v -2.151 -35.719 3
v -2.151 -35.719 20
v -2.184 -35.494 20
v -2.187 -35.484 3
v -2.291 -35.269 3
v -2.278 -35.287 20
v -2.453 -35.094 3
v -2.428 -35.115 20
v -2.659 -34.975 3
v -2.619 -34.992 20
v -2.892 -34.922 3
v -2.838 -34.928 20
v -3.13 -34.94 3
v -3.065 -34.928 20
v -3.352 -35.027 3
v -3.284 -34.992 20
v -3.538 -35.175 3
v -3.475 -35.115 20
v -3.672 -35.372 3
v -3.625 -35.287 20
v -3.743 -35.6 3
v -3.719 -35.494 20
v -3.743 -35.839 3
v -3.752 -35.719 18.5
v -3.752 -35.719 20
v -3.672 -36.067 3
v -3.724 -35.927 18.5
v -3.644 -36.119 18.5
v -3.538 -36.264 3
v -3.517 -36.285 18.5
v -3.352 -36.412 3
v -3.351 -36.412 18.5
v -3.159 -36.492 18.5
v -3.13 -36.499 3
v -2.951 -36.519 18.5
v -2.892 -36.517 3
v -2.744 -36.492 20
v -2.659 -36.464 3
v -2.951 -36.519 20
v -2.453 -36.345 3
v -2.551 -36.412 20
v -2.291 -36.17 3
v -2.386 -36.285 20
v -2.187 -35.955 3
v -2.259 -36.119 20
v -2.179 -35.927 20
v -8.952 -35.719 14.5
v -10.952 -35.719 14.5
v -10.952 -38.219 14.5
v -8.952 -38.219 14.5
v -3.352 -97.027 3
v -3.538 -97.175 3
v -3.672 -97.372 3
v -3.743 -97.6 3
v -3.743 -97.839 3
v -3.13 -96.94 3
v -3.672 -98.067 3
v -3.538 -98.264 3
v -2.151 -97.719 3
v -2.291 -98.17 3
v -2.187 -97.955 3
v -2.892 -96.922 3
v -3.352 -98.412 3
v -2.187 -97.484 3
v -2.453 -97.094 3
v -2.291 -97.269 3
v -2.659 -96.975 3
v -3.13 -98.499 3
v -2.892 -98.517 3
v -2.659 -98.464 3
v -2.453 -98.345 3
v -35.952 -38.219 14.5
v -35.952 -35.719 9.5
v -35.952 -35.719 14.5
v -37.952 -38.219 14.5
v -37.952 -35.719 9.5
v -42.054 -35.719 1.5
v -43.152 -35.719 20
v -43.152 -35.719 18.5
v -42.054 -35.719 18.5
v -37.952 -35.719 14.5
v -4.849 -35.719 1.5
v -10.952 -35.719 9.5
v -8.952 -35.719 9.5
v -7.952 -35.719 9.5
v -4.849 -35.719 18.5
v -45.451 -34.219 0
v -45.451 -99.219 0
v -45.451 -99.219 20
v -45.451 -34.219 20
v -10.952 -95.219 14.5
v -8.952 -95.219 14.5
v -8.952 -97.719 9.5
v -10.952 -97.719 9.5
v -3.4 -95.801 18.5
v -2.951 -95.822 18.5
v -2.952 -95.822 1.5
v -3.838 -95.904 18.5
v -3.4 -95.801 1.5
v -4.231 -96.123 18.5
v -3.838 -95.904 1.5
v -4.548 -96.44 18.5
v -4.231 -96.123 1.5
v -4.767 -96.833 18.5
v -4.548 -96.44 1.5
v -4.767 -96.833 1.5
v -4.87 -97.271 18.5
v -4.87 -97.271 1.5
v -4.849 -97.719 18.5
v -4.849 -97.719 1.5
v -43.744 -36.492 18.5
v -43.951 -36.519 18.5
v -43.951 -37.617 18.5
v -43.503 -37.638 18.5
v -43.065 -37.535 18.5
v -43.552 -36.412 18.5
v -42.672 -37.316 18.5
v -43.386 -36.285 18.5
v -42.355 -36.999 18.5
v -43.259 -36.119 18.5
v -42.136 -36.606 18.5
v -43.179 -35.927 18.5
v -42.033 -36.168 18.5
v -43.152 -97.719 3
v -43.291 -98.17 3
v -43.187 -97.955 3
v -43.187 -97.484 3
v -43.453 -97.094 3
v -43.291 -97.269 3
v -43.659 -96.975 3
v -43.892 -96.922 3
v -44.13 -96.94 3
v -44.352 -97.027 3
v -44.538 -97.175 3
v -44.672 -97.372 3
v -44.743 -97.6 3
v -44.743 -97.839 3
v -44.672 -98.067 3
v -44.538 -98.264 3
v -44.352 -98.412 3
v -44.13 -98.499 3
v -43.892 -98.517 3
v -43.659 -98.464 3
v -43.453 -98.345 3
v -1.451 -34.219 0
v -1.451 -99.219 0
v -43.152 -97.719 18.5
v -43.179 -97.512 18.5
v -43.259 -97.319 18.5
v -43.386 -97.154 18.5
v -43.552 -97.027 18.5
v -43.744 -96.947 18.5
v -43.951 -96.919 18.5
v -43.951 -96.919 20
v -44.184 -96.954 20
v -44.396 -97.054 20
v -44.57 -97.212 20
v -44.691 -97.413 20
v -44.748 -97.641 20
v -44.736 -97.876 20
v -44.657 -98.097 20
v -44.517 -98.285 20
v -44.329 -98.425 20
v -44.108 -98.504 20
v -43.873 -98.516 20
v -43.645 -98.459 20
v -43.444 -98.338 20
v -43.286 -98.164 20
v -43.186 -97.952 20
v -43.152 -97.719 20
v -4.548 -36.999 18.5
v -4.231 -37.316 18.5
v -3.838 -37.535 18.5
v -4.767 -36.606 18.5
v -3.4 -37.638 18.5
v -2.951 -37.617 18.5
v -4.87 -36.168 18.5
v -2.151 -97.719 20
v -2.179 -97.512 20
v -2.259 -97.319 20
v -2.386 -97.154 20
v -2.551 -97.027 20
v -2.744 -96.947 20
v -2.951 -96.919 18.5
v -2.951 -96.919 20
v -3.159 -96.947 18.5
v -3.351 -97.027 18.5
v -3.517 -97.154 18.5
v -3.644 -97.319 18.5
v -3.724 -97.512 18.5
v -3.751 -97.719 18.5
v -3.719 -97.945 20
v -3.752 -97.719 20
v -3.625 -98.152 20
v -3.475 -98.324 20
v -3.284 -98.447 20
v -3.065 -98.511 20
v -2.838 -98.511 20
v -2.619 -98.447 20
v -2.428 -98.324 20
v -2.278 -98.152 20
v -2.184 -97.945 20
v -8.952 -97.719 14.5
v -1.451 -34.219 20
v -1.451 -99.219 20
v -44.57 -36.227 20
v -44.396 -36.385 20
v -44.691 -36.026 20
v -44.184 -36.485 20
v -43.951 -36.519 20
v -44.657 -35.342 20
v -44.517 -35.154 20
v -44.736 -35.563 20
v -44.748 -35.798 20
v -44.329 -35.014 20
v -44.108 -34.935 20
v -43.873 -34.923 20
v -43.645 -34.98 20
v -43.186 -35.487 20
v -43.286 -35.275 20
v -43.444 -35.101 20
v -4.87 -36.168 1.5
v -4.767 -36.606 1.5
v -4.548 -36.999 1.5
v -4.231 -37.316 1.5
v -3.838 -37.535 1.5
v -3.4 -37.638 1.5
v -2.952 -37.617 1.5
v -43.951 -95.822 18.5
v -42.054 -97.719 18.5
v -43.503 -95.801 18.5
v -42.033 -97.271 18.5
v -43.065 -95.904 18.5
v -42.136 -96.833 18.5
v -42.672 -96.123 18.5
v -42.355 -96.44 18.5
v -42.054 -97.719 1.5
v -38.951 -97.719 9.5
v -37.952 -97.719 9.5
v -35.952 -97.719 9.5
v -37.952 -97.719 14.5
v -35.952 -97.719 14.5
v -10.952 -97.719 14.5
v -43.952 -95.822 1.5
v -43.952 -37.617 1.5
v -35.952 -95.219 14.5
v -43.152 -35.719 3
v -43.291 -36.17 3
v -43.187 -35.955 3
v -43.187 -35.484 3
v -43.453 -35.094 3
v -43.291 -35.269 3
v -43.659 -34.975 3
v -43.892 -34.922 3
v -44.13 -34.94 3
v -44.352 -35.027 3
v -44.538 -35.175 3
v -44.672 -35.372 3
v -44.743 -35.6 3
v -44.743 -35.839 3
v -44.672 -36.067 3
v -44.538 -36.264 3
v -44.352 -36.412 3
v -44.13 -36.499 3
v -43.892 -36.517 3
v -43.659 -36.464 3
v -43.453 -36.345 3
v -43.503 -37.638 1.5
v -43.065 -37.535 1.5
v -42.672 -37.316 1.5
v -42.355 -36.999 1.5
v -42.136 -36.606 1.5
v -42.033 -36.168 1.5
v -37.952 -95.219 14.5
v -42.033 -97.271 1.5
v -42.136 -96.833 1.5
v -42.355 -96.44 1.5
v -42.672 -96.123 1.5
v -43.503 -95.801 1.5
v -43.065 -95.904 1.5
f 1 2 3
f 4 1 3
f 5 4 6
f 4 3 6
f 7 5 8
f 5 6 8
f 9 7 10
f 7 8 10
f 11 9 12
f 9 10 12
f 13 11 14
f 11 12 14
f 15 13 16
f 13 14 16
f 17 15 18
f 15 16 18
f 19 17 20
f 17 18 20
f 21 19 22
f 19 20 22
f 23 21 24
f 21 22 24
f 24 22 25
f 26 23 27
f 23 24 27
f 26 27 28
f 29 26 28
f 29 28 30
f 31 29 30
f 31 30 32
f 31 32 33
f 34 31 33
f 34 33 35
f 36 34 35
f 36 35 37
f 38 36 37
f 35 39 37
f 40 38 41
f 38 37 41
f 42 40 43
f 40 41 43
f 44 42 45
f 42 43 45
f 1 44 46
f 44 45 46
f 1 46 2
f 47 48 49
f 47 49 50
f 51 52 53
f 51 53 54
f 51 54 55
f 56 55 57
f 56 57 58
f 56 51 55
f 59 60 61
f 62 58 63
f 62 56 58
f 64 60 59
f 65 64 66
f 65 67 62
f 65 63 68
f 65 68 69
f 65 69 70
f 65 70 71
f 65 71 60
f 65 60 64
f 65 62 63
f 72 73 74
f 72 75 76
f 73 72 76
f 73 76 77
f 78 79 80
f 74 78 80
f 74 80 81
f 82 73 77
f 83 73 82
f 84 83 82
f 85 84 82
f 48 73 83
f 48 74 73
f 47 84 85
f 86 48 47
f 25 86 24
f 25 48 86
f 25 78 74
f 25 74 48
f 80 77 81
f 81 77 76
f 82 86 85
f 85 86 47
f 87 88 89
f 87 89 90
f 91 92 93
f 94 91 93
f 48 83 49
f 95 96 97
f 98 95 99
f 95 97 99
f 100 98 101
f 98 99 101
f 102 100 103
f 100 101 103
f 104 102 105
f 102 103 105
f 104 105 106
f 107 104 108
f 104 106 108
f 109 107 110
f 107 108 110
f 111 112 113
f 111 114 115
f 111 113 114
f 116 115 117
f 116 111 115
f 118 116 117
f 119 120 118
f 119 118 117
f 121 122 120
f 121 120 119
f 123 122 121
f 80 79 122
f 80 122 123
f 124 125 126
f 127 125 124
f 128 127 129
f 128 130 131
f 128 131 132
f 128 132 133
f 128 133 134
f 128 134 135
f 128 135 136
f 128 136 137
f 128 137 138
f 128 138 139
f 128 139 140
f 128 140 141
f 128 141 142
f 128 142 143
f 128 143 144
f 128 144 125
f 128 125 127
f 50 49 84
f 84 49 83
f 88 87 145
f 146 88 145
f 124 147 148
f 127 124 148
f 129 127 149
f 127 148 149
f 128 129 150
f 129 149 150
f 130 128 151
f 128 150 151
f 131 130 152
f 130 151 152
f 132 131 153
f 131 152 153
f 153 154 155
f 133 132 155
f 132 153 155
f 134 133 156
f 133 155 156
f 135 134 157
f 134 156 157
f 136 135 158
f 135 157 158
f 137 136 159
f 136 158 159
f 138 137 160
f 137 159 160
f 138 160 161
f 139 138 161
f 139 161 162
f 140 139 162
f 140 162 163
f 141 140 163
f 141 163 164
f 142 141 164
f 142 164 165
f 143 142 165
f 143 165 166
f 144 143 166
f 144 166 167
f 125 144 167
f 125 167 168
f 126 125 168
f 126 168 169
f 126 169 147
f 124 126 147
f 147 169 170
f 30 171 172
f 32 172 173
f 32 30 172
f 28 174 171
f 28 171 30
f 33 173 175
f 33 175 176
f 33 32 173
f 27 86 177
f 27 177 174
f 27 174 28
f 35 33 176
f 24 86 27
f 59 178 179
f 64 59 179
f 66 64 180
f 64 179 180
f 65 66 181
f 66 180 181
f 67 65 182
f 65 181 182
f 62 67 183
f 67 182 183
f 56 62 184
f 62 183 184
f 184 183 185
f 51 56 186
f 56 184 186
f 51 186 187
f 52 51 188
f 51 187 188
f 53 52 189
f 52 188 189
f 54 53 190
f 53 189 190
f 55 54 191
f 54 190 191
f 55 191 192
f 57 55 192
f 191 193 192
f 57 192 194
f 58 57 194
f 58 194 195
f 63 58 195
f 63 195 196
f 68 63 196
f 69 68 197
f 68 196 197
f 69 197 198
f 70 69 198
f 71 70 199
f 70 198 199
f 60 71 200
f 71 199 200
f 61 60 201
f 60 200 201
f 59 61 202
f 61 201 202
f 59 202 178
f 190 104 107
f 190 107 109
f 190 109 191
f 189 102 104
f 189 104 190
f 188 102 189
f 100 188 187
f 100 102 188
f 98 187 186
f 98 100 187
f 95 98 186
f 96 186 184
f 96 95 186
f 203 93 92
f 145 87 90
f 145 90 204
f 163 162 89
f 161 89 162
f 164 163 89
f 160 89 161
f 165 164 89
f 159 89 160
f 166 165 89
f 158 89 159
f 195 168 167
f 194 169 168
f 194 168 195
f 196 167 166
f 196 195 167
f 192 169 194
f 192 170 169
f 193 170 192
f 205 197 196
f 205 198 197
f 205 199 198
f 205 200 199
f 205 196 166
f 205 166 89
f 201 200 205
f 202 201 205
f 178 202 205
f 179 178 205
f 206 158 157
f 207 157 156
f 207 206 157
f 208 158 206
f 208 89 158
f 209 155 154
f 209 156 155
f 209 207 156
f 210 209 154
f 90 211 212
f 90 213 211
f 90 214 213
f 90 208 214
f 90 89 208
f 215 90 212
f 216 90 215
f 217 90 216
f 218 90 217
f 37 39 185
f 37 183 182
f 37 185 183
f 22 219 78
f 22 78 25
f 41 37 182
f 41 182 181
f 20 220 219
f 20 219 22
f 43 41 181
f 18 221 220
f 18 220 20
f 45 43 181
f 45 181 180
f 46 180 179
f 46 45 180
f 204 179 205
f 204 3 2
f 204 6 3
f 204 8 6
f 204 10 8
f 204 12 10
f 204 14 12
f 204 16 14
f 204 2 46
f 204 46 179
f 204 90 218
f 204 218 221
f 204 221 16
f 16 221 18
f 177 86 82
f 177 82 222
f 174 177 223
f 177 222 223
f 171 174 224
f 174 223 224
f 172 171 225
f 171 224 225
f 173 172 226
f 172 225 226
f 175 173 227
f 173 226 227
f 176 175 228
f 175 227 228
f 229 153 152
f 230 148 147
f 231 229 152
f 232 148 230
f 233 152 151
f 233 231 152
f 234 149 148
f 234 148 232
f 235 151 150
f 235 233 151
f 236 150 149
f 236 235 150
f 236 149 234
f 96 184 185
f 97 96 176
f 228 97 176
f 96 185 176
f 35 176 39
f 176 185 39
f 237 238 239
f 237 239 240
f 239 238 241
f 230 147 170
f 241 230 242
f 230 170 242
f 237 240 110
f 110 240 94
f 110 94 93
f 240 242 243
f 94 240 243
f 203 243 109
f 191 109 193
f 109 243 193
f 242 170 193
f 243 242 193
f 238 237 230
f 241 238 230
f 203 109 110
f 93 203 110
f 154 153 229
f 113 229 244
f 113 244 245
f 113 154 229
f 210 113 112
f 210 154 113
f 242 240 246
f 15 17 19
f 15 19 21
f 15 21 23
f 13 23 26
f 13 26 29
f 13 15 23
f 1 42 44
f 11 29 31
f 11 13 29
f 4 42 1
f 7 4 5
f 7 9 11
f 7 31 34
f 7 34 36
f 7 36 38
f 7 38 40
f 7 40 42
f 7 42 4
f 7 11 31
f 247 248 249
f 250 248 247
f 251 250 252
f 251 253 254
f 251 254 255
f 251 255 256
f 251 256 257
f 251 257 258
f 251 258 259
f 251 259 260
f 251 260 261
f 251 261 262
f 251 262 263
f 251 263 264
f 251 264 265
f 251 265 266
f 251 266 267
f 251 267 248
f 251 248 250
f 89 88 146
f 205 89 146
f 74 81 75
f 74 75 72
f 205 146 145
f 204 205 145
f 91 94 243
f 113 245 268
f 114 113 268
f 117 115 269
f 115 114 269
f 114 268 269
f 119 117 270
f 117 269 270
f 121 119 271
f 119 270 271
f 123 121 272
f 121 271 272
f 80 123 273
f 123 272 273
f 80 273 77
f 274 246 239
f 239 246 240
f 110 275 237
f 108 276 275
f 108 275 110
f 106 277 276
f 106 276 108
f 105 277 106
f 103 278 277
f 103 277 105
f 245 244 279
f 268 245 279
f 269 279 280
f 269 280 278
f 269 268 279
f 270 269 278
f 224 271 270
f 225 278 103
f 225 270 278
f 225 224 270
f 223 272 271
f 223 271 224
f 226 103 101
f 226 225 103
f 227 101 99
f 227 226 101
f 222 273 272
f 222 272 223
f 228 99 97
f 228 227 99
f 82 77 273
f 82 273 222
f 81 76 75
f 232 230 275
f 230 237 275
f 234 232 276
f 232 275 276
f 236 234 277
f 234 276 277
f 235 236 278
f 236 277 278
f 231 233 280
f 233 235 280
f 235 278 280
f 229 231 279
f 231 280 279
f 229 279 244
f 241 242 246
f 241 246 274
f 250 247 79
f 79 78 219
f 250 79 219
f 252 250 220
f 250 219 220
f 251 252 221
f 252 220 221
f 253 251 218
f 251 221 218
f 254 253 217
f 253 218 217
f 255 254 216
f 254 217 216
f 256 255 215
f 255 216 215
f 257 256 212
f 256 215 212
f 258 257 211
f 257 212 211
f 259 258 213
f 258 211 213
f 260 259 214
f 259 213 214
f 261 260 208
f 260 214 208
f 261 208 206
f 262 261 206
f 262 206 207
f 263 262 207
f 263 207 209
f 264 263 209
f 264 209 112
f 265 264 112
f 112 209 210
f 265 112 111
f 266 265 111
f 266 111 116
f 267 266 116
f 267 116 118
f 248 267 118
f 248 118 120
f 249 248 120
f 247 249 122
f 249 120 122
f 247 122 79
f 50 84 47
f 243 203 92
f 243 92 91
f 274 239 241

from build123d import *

# Parameters (mm, degrees)
F0_W      = 44
F0_H      = 65
F1_DEPTH  = 20
F2_W      = 41
F2_H      = 62
F3_DEPTH  = 18.5
F4_W      = 2
F4_H      = 5
F5_DEPTH  = 5
F7_DEPTH  = 30
F8_W      = 2
F8_H      = 5
F9_DEPTH  = 5
F11_DEPTH = 30
F13_R     = 1.625
F14_DEPTH = 17
F15_R     = 0.8
F16_DEPTH = 17


with BuildPart() as f1:
    # F0 (on Top) → F1 (new body)
    with BuildSketch(Plane.XY):
        with Locations((-23.4515, -66.719449)):
            Rectangle(F0_W, F0_H)
    extrude(amount=F1_DEPTH)

    # F2 (on face) → F3 (cut)
    with BuildSketch(Plane.XY.offset(20)):
        with Locations((-23.4515, -66.719449)):
            Rectangle(F2_W, F2_H)
    extrude(amount=-F3_DEPTH, mode=Mode.SUBTRACT)

    # F4 (on face) → F5 (join)
    with BuildSketch(Plane.XZ.offset(35.719449)):
        with Locations((-36.9515, 12)):
            Rectangle(F4_W, F4_H)
        with Locations((-9.9515, 12)):
            Rectangle(F4_W, F4_H)
    extrude(amount=F5_DEPTH)

    # F6 (on face) → F7 (cut)
    with BuildSketch(Plane(origin=(-37.9515, 0, 0), x_dir=(0, -1, 0), z_dir=(-1, 0, 0))):
        Polygon((38.219449, 14.5), (35.719449, 9.5), (40.719449, 9.5), (40.719449, 14.5), align=None)
    extrude(amount=-F7_DEPTH, mode=Mode.SUBTRACT)

    # F8 (on face) → F9 (join)
    with BuildSketch(Plane(origin=(0, -97.719449, 0), x_dir=(-1, 0, 0), z_dir=(0, 1, 0))):
        with Locations((36.9515, 12)):
            Rectangle(F8_W, F8_H)
        with Locations((9.9515, 12)):
            Rectangle(F8_W, F8_H)
    extrude(amount=F9_DEPTH)

    # F10 (on face) → F11 (cut)
    with BuildSketch(Plane.YZ.offset(-8.9515)):
        Polygon((-95.219449, 14.5), (-97.719449, 9.5), (-92.719449, 9.5), (-92.719449, 14.5), align=None)
    extrude(amount=-F11_DEPTH, mode=Mode.SUBTRACT)

    # F13 (on face) → F14 (join)
    with BuildSketch(Plane.XY.offset(1.5)):
        with Locations((-43.6515, -36.019449)):
            Circle(F13_R)
        with Locations((-3.2515, -36.019449)):
            Circle(F13_R)
        with Locations((-3.2515, -97.419449)):
            Circle(F13_R)
        with Locations((-43.6515, -97.419449)):
            Circle(F13_R)
    extrude(amount=F14_DEPTH)

    # F15 (on face) → F16 (cut)
    with BuildSketch(Plane.XY.offset(20)):
        with Locations((-43.9515, -97.719449)):
            Circle(F15_R)
        with Locations((-2.9515, -97.719449)):
            Circle(F15_R)
        with Locations((-43.9515, -35.719449)):
            Circle(F15_R)
        with Locations((-2.9515, -35.719449)):
            Circle(F15_R)
    extrude(amount=-F16_DEPTH, mode=Mode.SUBTRACT)


solid = f1.part
